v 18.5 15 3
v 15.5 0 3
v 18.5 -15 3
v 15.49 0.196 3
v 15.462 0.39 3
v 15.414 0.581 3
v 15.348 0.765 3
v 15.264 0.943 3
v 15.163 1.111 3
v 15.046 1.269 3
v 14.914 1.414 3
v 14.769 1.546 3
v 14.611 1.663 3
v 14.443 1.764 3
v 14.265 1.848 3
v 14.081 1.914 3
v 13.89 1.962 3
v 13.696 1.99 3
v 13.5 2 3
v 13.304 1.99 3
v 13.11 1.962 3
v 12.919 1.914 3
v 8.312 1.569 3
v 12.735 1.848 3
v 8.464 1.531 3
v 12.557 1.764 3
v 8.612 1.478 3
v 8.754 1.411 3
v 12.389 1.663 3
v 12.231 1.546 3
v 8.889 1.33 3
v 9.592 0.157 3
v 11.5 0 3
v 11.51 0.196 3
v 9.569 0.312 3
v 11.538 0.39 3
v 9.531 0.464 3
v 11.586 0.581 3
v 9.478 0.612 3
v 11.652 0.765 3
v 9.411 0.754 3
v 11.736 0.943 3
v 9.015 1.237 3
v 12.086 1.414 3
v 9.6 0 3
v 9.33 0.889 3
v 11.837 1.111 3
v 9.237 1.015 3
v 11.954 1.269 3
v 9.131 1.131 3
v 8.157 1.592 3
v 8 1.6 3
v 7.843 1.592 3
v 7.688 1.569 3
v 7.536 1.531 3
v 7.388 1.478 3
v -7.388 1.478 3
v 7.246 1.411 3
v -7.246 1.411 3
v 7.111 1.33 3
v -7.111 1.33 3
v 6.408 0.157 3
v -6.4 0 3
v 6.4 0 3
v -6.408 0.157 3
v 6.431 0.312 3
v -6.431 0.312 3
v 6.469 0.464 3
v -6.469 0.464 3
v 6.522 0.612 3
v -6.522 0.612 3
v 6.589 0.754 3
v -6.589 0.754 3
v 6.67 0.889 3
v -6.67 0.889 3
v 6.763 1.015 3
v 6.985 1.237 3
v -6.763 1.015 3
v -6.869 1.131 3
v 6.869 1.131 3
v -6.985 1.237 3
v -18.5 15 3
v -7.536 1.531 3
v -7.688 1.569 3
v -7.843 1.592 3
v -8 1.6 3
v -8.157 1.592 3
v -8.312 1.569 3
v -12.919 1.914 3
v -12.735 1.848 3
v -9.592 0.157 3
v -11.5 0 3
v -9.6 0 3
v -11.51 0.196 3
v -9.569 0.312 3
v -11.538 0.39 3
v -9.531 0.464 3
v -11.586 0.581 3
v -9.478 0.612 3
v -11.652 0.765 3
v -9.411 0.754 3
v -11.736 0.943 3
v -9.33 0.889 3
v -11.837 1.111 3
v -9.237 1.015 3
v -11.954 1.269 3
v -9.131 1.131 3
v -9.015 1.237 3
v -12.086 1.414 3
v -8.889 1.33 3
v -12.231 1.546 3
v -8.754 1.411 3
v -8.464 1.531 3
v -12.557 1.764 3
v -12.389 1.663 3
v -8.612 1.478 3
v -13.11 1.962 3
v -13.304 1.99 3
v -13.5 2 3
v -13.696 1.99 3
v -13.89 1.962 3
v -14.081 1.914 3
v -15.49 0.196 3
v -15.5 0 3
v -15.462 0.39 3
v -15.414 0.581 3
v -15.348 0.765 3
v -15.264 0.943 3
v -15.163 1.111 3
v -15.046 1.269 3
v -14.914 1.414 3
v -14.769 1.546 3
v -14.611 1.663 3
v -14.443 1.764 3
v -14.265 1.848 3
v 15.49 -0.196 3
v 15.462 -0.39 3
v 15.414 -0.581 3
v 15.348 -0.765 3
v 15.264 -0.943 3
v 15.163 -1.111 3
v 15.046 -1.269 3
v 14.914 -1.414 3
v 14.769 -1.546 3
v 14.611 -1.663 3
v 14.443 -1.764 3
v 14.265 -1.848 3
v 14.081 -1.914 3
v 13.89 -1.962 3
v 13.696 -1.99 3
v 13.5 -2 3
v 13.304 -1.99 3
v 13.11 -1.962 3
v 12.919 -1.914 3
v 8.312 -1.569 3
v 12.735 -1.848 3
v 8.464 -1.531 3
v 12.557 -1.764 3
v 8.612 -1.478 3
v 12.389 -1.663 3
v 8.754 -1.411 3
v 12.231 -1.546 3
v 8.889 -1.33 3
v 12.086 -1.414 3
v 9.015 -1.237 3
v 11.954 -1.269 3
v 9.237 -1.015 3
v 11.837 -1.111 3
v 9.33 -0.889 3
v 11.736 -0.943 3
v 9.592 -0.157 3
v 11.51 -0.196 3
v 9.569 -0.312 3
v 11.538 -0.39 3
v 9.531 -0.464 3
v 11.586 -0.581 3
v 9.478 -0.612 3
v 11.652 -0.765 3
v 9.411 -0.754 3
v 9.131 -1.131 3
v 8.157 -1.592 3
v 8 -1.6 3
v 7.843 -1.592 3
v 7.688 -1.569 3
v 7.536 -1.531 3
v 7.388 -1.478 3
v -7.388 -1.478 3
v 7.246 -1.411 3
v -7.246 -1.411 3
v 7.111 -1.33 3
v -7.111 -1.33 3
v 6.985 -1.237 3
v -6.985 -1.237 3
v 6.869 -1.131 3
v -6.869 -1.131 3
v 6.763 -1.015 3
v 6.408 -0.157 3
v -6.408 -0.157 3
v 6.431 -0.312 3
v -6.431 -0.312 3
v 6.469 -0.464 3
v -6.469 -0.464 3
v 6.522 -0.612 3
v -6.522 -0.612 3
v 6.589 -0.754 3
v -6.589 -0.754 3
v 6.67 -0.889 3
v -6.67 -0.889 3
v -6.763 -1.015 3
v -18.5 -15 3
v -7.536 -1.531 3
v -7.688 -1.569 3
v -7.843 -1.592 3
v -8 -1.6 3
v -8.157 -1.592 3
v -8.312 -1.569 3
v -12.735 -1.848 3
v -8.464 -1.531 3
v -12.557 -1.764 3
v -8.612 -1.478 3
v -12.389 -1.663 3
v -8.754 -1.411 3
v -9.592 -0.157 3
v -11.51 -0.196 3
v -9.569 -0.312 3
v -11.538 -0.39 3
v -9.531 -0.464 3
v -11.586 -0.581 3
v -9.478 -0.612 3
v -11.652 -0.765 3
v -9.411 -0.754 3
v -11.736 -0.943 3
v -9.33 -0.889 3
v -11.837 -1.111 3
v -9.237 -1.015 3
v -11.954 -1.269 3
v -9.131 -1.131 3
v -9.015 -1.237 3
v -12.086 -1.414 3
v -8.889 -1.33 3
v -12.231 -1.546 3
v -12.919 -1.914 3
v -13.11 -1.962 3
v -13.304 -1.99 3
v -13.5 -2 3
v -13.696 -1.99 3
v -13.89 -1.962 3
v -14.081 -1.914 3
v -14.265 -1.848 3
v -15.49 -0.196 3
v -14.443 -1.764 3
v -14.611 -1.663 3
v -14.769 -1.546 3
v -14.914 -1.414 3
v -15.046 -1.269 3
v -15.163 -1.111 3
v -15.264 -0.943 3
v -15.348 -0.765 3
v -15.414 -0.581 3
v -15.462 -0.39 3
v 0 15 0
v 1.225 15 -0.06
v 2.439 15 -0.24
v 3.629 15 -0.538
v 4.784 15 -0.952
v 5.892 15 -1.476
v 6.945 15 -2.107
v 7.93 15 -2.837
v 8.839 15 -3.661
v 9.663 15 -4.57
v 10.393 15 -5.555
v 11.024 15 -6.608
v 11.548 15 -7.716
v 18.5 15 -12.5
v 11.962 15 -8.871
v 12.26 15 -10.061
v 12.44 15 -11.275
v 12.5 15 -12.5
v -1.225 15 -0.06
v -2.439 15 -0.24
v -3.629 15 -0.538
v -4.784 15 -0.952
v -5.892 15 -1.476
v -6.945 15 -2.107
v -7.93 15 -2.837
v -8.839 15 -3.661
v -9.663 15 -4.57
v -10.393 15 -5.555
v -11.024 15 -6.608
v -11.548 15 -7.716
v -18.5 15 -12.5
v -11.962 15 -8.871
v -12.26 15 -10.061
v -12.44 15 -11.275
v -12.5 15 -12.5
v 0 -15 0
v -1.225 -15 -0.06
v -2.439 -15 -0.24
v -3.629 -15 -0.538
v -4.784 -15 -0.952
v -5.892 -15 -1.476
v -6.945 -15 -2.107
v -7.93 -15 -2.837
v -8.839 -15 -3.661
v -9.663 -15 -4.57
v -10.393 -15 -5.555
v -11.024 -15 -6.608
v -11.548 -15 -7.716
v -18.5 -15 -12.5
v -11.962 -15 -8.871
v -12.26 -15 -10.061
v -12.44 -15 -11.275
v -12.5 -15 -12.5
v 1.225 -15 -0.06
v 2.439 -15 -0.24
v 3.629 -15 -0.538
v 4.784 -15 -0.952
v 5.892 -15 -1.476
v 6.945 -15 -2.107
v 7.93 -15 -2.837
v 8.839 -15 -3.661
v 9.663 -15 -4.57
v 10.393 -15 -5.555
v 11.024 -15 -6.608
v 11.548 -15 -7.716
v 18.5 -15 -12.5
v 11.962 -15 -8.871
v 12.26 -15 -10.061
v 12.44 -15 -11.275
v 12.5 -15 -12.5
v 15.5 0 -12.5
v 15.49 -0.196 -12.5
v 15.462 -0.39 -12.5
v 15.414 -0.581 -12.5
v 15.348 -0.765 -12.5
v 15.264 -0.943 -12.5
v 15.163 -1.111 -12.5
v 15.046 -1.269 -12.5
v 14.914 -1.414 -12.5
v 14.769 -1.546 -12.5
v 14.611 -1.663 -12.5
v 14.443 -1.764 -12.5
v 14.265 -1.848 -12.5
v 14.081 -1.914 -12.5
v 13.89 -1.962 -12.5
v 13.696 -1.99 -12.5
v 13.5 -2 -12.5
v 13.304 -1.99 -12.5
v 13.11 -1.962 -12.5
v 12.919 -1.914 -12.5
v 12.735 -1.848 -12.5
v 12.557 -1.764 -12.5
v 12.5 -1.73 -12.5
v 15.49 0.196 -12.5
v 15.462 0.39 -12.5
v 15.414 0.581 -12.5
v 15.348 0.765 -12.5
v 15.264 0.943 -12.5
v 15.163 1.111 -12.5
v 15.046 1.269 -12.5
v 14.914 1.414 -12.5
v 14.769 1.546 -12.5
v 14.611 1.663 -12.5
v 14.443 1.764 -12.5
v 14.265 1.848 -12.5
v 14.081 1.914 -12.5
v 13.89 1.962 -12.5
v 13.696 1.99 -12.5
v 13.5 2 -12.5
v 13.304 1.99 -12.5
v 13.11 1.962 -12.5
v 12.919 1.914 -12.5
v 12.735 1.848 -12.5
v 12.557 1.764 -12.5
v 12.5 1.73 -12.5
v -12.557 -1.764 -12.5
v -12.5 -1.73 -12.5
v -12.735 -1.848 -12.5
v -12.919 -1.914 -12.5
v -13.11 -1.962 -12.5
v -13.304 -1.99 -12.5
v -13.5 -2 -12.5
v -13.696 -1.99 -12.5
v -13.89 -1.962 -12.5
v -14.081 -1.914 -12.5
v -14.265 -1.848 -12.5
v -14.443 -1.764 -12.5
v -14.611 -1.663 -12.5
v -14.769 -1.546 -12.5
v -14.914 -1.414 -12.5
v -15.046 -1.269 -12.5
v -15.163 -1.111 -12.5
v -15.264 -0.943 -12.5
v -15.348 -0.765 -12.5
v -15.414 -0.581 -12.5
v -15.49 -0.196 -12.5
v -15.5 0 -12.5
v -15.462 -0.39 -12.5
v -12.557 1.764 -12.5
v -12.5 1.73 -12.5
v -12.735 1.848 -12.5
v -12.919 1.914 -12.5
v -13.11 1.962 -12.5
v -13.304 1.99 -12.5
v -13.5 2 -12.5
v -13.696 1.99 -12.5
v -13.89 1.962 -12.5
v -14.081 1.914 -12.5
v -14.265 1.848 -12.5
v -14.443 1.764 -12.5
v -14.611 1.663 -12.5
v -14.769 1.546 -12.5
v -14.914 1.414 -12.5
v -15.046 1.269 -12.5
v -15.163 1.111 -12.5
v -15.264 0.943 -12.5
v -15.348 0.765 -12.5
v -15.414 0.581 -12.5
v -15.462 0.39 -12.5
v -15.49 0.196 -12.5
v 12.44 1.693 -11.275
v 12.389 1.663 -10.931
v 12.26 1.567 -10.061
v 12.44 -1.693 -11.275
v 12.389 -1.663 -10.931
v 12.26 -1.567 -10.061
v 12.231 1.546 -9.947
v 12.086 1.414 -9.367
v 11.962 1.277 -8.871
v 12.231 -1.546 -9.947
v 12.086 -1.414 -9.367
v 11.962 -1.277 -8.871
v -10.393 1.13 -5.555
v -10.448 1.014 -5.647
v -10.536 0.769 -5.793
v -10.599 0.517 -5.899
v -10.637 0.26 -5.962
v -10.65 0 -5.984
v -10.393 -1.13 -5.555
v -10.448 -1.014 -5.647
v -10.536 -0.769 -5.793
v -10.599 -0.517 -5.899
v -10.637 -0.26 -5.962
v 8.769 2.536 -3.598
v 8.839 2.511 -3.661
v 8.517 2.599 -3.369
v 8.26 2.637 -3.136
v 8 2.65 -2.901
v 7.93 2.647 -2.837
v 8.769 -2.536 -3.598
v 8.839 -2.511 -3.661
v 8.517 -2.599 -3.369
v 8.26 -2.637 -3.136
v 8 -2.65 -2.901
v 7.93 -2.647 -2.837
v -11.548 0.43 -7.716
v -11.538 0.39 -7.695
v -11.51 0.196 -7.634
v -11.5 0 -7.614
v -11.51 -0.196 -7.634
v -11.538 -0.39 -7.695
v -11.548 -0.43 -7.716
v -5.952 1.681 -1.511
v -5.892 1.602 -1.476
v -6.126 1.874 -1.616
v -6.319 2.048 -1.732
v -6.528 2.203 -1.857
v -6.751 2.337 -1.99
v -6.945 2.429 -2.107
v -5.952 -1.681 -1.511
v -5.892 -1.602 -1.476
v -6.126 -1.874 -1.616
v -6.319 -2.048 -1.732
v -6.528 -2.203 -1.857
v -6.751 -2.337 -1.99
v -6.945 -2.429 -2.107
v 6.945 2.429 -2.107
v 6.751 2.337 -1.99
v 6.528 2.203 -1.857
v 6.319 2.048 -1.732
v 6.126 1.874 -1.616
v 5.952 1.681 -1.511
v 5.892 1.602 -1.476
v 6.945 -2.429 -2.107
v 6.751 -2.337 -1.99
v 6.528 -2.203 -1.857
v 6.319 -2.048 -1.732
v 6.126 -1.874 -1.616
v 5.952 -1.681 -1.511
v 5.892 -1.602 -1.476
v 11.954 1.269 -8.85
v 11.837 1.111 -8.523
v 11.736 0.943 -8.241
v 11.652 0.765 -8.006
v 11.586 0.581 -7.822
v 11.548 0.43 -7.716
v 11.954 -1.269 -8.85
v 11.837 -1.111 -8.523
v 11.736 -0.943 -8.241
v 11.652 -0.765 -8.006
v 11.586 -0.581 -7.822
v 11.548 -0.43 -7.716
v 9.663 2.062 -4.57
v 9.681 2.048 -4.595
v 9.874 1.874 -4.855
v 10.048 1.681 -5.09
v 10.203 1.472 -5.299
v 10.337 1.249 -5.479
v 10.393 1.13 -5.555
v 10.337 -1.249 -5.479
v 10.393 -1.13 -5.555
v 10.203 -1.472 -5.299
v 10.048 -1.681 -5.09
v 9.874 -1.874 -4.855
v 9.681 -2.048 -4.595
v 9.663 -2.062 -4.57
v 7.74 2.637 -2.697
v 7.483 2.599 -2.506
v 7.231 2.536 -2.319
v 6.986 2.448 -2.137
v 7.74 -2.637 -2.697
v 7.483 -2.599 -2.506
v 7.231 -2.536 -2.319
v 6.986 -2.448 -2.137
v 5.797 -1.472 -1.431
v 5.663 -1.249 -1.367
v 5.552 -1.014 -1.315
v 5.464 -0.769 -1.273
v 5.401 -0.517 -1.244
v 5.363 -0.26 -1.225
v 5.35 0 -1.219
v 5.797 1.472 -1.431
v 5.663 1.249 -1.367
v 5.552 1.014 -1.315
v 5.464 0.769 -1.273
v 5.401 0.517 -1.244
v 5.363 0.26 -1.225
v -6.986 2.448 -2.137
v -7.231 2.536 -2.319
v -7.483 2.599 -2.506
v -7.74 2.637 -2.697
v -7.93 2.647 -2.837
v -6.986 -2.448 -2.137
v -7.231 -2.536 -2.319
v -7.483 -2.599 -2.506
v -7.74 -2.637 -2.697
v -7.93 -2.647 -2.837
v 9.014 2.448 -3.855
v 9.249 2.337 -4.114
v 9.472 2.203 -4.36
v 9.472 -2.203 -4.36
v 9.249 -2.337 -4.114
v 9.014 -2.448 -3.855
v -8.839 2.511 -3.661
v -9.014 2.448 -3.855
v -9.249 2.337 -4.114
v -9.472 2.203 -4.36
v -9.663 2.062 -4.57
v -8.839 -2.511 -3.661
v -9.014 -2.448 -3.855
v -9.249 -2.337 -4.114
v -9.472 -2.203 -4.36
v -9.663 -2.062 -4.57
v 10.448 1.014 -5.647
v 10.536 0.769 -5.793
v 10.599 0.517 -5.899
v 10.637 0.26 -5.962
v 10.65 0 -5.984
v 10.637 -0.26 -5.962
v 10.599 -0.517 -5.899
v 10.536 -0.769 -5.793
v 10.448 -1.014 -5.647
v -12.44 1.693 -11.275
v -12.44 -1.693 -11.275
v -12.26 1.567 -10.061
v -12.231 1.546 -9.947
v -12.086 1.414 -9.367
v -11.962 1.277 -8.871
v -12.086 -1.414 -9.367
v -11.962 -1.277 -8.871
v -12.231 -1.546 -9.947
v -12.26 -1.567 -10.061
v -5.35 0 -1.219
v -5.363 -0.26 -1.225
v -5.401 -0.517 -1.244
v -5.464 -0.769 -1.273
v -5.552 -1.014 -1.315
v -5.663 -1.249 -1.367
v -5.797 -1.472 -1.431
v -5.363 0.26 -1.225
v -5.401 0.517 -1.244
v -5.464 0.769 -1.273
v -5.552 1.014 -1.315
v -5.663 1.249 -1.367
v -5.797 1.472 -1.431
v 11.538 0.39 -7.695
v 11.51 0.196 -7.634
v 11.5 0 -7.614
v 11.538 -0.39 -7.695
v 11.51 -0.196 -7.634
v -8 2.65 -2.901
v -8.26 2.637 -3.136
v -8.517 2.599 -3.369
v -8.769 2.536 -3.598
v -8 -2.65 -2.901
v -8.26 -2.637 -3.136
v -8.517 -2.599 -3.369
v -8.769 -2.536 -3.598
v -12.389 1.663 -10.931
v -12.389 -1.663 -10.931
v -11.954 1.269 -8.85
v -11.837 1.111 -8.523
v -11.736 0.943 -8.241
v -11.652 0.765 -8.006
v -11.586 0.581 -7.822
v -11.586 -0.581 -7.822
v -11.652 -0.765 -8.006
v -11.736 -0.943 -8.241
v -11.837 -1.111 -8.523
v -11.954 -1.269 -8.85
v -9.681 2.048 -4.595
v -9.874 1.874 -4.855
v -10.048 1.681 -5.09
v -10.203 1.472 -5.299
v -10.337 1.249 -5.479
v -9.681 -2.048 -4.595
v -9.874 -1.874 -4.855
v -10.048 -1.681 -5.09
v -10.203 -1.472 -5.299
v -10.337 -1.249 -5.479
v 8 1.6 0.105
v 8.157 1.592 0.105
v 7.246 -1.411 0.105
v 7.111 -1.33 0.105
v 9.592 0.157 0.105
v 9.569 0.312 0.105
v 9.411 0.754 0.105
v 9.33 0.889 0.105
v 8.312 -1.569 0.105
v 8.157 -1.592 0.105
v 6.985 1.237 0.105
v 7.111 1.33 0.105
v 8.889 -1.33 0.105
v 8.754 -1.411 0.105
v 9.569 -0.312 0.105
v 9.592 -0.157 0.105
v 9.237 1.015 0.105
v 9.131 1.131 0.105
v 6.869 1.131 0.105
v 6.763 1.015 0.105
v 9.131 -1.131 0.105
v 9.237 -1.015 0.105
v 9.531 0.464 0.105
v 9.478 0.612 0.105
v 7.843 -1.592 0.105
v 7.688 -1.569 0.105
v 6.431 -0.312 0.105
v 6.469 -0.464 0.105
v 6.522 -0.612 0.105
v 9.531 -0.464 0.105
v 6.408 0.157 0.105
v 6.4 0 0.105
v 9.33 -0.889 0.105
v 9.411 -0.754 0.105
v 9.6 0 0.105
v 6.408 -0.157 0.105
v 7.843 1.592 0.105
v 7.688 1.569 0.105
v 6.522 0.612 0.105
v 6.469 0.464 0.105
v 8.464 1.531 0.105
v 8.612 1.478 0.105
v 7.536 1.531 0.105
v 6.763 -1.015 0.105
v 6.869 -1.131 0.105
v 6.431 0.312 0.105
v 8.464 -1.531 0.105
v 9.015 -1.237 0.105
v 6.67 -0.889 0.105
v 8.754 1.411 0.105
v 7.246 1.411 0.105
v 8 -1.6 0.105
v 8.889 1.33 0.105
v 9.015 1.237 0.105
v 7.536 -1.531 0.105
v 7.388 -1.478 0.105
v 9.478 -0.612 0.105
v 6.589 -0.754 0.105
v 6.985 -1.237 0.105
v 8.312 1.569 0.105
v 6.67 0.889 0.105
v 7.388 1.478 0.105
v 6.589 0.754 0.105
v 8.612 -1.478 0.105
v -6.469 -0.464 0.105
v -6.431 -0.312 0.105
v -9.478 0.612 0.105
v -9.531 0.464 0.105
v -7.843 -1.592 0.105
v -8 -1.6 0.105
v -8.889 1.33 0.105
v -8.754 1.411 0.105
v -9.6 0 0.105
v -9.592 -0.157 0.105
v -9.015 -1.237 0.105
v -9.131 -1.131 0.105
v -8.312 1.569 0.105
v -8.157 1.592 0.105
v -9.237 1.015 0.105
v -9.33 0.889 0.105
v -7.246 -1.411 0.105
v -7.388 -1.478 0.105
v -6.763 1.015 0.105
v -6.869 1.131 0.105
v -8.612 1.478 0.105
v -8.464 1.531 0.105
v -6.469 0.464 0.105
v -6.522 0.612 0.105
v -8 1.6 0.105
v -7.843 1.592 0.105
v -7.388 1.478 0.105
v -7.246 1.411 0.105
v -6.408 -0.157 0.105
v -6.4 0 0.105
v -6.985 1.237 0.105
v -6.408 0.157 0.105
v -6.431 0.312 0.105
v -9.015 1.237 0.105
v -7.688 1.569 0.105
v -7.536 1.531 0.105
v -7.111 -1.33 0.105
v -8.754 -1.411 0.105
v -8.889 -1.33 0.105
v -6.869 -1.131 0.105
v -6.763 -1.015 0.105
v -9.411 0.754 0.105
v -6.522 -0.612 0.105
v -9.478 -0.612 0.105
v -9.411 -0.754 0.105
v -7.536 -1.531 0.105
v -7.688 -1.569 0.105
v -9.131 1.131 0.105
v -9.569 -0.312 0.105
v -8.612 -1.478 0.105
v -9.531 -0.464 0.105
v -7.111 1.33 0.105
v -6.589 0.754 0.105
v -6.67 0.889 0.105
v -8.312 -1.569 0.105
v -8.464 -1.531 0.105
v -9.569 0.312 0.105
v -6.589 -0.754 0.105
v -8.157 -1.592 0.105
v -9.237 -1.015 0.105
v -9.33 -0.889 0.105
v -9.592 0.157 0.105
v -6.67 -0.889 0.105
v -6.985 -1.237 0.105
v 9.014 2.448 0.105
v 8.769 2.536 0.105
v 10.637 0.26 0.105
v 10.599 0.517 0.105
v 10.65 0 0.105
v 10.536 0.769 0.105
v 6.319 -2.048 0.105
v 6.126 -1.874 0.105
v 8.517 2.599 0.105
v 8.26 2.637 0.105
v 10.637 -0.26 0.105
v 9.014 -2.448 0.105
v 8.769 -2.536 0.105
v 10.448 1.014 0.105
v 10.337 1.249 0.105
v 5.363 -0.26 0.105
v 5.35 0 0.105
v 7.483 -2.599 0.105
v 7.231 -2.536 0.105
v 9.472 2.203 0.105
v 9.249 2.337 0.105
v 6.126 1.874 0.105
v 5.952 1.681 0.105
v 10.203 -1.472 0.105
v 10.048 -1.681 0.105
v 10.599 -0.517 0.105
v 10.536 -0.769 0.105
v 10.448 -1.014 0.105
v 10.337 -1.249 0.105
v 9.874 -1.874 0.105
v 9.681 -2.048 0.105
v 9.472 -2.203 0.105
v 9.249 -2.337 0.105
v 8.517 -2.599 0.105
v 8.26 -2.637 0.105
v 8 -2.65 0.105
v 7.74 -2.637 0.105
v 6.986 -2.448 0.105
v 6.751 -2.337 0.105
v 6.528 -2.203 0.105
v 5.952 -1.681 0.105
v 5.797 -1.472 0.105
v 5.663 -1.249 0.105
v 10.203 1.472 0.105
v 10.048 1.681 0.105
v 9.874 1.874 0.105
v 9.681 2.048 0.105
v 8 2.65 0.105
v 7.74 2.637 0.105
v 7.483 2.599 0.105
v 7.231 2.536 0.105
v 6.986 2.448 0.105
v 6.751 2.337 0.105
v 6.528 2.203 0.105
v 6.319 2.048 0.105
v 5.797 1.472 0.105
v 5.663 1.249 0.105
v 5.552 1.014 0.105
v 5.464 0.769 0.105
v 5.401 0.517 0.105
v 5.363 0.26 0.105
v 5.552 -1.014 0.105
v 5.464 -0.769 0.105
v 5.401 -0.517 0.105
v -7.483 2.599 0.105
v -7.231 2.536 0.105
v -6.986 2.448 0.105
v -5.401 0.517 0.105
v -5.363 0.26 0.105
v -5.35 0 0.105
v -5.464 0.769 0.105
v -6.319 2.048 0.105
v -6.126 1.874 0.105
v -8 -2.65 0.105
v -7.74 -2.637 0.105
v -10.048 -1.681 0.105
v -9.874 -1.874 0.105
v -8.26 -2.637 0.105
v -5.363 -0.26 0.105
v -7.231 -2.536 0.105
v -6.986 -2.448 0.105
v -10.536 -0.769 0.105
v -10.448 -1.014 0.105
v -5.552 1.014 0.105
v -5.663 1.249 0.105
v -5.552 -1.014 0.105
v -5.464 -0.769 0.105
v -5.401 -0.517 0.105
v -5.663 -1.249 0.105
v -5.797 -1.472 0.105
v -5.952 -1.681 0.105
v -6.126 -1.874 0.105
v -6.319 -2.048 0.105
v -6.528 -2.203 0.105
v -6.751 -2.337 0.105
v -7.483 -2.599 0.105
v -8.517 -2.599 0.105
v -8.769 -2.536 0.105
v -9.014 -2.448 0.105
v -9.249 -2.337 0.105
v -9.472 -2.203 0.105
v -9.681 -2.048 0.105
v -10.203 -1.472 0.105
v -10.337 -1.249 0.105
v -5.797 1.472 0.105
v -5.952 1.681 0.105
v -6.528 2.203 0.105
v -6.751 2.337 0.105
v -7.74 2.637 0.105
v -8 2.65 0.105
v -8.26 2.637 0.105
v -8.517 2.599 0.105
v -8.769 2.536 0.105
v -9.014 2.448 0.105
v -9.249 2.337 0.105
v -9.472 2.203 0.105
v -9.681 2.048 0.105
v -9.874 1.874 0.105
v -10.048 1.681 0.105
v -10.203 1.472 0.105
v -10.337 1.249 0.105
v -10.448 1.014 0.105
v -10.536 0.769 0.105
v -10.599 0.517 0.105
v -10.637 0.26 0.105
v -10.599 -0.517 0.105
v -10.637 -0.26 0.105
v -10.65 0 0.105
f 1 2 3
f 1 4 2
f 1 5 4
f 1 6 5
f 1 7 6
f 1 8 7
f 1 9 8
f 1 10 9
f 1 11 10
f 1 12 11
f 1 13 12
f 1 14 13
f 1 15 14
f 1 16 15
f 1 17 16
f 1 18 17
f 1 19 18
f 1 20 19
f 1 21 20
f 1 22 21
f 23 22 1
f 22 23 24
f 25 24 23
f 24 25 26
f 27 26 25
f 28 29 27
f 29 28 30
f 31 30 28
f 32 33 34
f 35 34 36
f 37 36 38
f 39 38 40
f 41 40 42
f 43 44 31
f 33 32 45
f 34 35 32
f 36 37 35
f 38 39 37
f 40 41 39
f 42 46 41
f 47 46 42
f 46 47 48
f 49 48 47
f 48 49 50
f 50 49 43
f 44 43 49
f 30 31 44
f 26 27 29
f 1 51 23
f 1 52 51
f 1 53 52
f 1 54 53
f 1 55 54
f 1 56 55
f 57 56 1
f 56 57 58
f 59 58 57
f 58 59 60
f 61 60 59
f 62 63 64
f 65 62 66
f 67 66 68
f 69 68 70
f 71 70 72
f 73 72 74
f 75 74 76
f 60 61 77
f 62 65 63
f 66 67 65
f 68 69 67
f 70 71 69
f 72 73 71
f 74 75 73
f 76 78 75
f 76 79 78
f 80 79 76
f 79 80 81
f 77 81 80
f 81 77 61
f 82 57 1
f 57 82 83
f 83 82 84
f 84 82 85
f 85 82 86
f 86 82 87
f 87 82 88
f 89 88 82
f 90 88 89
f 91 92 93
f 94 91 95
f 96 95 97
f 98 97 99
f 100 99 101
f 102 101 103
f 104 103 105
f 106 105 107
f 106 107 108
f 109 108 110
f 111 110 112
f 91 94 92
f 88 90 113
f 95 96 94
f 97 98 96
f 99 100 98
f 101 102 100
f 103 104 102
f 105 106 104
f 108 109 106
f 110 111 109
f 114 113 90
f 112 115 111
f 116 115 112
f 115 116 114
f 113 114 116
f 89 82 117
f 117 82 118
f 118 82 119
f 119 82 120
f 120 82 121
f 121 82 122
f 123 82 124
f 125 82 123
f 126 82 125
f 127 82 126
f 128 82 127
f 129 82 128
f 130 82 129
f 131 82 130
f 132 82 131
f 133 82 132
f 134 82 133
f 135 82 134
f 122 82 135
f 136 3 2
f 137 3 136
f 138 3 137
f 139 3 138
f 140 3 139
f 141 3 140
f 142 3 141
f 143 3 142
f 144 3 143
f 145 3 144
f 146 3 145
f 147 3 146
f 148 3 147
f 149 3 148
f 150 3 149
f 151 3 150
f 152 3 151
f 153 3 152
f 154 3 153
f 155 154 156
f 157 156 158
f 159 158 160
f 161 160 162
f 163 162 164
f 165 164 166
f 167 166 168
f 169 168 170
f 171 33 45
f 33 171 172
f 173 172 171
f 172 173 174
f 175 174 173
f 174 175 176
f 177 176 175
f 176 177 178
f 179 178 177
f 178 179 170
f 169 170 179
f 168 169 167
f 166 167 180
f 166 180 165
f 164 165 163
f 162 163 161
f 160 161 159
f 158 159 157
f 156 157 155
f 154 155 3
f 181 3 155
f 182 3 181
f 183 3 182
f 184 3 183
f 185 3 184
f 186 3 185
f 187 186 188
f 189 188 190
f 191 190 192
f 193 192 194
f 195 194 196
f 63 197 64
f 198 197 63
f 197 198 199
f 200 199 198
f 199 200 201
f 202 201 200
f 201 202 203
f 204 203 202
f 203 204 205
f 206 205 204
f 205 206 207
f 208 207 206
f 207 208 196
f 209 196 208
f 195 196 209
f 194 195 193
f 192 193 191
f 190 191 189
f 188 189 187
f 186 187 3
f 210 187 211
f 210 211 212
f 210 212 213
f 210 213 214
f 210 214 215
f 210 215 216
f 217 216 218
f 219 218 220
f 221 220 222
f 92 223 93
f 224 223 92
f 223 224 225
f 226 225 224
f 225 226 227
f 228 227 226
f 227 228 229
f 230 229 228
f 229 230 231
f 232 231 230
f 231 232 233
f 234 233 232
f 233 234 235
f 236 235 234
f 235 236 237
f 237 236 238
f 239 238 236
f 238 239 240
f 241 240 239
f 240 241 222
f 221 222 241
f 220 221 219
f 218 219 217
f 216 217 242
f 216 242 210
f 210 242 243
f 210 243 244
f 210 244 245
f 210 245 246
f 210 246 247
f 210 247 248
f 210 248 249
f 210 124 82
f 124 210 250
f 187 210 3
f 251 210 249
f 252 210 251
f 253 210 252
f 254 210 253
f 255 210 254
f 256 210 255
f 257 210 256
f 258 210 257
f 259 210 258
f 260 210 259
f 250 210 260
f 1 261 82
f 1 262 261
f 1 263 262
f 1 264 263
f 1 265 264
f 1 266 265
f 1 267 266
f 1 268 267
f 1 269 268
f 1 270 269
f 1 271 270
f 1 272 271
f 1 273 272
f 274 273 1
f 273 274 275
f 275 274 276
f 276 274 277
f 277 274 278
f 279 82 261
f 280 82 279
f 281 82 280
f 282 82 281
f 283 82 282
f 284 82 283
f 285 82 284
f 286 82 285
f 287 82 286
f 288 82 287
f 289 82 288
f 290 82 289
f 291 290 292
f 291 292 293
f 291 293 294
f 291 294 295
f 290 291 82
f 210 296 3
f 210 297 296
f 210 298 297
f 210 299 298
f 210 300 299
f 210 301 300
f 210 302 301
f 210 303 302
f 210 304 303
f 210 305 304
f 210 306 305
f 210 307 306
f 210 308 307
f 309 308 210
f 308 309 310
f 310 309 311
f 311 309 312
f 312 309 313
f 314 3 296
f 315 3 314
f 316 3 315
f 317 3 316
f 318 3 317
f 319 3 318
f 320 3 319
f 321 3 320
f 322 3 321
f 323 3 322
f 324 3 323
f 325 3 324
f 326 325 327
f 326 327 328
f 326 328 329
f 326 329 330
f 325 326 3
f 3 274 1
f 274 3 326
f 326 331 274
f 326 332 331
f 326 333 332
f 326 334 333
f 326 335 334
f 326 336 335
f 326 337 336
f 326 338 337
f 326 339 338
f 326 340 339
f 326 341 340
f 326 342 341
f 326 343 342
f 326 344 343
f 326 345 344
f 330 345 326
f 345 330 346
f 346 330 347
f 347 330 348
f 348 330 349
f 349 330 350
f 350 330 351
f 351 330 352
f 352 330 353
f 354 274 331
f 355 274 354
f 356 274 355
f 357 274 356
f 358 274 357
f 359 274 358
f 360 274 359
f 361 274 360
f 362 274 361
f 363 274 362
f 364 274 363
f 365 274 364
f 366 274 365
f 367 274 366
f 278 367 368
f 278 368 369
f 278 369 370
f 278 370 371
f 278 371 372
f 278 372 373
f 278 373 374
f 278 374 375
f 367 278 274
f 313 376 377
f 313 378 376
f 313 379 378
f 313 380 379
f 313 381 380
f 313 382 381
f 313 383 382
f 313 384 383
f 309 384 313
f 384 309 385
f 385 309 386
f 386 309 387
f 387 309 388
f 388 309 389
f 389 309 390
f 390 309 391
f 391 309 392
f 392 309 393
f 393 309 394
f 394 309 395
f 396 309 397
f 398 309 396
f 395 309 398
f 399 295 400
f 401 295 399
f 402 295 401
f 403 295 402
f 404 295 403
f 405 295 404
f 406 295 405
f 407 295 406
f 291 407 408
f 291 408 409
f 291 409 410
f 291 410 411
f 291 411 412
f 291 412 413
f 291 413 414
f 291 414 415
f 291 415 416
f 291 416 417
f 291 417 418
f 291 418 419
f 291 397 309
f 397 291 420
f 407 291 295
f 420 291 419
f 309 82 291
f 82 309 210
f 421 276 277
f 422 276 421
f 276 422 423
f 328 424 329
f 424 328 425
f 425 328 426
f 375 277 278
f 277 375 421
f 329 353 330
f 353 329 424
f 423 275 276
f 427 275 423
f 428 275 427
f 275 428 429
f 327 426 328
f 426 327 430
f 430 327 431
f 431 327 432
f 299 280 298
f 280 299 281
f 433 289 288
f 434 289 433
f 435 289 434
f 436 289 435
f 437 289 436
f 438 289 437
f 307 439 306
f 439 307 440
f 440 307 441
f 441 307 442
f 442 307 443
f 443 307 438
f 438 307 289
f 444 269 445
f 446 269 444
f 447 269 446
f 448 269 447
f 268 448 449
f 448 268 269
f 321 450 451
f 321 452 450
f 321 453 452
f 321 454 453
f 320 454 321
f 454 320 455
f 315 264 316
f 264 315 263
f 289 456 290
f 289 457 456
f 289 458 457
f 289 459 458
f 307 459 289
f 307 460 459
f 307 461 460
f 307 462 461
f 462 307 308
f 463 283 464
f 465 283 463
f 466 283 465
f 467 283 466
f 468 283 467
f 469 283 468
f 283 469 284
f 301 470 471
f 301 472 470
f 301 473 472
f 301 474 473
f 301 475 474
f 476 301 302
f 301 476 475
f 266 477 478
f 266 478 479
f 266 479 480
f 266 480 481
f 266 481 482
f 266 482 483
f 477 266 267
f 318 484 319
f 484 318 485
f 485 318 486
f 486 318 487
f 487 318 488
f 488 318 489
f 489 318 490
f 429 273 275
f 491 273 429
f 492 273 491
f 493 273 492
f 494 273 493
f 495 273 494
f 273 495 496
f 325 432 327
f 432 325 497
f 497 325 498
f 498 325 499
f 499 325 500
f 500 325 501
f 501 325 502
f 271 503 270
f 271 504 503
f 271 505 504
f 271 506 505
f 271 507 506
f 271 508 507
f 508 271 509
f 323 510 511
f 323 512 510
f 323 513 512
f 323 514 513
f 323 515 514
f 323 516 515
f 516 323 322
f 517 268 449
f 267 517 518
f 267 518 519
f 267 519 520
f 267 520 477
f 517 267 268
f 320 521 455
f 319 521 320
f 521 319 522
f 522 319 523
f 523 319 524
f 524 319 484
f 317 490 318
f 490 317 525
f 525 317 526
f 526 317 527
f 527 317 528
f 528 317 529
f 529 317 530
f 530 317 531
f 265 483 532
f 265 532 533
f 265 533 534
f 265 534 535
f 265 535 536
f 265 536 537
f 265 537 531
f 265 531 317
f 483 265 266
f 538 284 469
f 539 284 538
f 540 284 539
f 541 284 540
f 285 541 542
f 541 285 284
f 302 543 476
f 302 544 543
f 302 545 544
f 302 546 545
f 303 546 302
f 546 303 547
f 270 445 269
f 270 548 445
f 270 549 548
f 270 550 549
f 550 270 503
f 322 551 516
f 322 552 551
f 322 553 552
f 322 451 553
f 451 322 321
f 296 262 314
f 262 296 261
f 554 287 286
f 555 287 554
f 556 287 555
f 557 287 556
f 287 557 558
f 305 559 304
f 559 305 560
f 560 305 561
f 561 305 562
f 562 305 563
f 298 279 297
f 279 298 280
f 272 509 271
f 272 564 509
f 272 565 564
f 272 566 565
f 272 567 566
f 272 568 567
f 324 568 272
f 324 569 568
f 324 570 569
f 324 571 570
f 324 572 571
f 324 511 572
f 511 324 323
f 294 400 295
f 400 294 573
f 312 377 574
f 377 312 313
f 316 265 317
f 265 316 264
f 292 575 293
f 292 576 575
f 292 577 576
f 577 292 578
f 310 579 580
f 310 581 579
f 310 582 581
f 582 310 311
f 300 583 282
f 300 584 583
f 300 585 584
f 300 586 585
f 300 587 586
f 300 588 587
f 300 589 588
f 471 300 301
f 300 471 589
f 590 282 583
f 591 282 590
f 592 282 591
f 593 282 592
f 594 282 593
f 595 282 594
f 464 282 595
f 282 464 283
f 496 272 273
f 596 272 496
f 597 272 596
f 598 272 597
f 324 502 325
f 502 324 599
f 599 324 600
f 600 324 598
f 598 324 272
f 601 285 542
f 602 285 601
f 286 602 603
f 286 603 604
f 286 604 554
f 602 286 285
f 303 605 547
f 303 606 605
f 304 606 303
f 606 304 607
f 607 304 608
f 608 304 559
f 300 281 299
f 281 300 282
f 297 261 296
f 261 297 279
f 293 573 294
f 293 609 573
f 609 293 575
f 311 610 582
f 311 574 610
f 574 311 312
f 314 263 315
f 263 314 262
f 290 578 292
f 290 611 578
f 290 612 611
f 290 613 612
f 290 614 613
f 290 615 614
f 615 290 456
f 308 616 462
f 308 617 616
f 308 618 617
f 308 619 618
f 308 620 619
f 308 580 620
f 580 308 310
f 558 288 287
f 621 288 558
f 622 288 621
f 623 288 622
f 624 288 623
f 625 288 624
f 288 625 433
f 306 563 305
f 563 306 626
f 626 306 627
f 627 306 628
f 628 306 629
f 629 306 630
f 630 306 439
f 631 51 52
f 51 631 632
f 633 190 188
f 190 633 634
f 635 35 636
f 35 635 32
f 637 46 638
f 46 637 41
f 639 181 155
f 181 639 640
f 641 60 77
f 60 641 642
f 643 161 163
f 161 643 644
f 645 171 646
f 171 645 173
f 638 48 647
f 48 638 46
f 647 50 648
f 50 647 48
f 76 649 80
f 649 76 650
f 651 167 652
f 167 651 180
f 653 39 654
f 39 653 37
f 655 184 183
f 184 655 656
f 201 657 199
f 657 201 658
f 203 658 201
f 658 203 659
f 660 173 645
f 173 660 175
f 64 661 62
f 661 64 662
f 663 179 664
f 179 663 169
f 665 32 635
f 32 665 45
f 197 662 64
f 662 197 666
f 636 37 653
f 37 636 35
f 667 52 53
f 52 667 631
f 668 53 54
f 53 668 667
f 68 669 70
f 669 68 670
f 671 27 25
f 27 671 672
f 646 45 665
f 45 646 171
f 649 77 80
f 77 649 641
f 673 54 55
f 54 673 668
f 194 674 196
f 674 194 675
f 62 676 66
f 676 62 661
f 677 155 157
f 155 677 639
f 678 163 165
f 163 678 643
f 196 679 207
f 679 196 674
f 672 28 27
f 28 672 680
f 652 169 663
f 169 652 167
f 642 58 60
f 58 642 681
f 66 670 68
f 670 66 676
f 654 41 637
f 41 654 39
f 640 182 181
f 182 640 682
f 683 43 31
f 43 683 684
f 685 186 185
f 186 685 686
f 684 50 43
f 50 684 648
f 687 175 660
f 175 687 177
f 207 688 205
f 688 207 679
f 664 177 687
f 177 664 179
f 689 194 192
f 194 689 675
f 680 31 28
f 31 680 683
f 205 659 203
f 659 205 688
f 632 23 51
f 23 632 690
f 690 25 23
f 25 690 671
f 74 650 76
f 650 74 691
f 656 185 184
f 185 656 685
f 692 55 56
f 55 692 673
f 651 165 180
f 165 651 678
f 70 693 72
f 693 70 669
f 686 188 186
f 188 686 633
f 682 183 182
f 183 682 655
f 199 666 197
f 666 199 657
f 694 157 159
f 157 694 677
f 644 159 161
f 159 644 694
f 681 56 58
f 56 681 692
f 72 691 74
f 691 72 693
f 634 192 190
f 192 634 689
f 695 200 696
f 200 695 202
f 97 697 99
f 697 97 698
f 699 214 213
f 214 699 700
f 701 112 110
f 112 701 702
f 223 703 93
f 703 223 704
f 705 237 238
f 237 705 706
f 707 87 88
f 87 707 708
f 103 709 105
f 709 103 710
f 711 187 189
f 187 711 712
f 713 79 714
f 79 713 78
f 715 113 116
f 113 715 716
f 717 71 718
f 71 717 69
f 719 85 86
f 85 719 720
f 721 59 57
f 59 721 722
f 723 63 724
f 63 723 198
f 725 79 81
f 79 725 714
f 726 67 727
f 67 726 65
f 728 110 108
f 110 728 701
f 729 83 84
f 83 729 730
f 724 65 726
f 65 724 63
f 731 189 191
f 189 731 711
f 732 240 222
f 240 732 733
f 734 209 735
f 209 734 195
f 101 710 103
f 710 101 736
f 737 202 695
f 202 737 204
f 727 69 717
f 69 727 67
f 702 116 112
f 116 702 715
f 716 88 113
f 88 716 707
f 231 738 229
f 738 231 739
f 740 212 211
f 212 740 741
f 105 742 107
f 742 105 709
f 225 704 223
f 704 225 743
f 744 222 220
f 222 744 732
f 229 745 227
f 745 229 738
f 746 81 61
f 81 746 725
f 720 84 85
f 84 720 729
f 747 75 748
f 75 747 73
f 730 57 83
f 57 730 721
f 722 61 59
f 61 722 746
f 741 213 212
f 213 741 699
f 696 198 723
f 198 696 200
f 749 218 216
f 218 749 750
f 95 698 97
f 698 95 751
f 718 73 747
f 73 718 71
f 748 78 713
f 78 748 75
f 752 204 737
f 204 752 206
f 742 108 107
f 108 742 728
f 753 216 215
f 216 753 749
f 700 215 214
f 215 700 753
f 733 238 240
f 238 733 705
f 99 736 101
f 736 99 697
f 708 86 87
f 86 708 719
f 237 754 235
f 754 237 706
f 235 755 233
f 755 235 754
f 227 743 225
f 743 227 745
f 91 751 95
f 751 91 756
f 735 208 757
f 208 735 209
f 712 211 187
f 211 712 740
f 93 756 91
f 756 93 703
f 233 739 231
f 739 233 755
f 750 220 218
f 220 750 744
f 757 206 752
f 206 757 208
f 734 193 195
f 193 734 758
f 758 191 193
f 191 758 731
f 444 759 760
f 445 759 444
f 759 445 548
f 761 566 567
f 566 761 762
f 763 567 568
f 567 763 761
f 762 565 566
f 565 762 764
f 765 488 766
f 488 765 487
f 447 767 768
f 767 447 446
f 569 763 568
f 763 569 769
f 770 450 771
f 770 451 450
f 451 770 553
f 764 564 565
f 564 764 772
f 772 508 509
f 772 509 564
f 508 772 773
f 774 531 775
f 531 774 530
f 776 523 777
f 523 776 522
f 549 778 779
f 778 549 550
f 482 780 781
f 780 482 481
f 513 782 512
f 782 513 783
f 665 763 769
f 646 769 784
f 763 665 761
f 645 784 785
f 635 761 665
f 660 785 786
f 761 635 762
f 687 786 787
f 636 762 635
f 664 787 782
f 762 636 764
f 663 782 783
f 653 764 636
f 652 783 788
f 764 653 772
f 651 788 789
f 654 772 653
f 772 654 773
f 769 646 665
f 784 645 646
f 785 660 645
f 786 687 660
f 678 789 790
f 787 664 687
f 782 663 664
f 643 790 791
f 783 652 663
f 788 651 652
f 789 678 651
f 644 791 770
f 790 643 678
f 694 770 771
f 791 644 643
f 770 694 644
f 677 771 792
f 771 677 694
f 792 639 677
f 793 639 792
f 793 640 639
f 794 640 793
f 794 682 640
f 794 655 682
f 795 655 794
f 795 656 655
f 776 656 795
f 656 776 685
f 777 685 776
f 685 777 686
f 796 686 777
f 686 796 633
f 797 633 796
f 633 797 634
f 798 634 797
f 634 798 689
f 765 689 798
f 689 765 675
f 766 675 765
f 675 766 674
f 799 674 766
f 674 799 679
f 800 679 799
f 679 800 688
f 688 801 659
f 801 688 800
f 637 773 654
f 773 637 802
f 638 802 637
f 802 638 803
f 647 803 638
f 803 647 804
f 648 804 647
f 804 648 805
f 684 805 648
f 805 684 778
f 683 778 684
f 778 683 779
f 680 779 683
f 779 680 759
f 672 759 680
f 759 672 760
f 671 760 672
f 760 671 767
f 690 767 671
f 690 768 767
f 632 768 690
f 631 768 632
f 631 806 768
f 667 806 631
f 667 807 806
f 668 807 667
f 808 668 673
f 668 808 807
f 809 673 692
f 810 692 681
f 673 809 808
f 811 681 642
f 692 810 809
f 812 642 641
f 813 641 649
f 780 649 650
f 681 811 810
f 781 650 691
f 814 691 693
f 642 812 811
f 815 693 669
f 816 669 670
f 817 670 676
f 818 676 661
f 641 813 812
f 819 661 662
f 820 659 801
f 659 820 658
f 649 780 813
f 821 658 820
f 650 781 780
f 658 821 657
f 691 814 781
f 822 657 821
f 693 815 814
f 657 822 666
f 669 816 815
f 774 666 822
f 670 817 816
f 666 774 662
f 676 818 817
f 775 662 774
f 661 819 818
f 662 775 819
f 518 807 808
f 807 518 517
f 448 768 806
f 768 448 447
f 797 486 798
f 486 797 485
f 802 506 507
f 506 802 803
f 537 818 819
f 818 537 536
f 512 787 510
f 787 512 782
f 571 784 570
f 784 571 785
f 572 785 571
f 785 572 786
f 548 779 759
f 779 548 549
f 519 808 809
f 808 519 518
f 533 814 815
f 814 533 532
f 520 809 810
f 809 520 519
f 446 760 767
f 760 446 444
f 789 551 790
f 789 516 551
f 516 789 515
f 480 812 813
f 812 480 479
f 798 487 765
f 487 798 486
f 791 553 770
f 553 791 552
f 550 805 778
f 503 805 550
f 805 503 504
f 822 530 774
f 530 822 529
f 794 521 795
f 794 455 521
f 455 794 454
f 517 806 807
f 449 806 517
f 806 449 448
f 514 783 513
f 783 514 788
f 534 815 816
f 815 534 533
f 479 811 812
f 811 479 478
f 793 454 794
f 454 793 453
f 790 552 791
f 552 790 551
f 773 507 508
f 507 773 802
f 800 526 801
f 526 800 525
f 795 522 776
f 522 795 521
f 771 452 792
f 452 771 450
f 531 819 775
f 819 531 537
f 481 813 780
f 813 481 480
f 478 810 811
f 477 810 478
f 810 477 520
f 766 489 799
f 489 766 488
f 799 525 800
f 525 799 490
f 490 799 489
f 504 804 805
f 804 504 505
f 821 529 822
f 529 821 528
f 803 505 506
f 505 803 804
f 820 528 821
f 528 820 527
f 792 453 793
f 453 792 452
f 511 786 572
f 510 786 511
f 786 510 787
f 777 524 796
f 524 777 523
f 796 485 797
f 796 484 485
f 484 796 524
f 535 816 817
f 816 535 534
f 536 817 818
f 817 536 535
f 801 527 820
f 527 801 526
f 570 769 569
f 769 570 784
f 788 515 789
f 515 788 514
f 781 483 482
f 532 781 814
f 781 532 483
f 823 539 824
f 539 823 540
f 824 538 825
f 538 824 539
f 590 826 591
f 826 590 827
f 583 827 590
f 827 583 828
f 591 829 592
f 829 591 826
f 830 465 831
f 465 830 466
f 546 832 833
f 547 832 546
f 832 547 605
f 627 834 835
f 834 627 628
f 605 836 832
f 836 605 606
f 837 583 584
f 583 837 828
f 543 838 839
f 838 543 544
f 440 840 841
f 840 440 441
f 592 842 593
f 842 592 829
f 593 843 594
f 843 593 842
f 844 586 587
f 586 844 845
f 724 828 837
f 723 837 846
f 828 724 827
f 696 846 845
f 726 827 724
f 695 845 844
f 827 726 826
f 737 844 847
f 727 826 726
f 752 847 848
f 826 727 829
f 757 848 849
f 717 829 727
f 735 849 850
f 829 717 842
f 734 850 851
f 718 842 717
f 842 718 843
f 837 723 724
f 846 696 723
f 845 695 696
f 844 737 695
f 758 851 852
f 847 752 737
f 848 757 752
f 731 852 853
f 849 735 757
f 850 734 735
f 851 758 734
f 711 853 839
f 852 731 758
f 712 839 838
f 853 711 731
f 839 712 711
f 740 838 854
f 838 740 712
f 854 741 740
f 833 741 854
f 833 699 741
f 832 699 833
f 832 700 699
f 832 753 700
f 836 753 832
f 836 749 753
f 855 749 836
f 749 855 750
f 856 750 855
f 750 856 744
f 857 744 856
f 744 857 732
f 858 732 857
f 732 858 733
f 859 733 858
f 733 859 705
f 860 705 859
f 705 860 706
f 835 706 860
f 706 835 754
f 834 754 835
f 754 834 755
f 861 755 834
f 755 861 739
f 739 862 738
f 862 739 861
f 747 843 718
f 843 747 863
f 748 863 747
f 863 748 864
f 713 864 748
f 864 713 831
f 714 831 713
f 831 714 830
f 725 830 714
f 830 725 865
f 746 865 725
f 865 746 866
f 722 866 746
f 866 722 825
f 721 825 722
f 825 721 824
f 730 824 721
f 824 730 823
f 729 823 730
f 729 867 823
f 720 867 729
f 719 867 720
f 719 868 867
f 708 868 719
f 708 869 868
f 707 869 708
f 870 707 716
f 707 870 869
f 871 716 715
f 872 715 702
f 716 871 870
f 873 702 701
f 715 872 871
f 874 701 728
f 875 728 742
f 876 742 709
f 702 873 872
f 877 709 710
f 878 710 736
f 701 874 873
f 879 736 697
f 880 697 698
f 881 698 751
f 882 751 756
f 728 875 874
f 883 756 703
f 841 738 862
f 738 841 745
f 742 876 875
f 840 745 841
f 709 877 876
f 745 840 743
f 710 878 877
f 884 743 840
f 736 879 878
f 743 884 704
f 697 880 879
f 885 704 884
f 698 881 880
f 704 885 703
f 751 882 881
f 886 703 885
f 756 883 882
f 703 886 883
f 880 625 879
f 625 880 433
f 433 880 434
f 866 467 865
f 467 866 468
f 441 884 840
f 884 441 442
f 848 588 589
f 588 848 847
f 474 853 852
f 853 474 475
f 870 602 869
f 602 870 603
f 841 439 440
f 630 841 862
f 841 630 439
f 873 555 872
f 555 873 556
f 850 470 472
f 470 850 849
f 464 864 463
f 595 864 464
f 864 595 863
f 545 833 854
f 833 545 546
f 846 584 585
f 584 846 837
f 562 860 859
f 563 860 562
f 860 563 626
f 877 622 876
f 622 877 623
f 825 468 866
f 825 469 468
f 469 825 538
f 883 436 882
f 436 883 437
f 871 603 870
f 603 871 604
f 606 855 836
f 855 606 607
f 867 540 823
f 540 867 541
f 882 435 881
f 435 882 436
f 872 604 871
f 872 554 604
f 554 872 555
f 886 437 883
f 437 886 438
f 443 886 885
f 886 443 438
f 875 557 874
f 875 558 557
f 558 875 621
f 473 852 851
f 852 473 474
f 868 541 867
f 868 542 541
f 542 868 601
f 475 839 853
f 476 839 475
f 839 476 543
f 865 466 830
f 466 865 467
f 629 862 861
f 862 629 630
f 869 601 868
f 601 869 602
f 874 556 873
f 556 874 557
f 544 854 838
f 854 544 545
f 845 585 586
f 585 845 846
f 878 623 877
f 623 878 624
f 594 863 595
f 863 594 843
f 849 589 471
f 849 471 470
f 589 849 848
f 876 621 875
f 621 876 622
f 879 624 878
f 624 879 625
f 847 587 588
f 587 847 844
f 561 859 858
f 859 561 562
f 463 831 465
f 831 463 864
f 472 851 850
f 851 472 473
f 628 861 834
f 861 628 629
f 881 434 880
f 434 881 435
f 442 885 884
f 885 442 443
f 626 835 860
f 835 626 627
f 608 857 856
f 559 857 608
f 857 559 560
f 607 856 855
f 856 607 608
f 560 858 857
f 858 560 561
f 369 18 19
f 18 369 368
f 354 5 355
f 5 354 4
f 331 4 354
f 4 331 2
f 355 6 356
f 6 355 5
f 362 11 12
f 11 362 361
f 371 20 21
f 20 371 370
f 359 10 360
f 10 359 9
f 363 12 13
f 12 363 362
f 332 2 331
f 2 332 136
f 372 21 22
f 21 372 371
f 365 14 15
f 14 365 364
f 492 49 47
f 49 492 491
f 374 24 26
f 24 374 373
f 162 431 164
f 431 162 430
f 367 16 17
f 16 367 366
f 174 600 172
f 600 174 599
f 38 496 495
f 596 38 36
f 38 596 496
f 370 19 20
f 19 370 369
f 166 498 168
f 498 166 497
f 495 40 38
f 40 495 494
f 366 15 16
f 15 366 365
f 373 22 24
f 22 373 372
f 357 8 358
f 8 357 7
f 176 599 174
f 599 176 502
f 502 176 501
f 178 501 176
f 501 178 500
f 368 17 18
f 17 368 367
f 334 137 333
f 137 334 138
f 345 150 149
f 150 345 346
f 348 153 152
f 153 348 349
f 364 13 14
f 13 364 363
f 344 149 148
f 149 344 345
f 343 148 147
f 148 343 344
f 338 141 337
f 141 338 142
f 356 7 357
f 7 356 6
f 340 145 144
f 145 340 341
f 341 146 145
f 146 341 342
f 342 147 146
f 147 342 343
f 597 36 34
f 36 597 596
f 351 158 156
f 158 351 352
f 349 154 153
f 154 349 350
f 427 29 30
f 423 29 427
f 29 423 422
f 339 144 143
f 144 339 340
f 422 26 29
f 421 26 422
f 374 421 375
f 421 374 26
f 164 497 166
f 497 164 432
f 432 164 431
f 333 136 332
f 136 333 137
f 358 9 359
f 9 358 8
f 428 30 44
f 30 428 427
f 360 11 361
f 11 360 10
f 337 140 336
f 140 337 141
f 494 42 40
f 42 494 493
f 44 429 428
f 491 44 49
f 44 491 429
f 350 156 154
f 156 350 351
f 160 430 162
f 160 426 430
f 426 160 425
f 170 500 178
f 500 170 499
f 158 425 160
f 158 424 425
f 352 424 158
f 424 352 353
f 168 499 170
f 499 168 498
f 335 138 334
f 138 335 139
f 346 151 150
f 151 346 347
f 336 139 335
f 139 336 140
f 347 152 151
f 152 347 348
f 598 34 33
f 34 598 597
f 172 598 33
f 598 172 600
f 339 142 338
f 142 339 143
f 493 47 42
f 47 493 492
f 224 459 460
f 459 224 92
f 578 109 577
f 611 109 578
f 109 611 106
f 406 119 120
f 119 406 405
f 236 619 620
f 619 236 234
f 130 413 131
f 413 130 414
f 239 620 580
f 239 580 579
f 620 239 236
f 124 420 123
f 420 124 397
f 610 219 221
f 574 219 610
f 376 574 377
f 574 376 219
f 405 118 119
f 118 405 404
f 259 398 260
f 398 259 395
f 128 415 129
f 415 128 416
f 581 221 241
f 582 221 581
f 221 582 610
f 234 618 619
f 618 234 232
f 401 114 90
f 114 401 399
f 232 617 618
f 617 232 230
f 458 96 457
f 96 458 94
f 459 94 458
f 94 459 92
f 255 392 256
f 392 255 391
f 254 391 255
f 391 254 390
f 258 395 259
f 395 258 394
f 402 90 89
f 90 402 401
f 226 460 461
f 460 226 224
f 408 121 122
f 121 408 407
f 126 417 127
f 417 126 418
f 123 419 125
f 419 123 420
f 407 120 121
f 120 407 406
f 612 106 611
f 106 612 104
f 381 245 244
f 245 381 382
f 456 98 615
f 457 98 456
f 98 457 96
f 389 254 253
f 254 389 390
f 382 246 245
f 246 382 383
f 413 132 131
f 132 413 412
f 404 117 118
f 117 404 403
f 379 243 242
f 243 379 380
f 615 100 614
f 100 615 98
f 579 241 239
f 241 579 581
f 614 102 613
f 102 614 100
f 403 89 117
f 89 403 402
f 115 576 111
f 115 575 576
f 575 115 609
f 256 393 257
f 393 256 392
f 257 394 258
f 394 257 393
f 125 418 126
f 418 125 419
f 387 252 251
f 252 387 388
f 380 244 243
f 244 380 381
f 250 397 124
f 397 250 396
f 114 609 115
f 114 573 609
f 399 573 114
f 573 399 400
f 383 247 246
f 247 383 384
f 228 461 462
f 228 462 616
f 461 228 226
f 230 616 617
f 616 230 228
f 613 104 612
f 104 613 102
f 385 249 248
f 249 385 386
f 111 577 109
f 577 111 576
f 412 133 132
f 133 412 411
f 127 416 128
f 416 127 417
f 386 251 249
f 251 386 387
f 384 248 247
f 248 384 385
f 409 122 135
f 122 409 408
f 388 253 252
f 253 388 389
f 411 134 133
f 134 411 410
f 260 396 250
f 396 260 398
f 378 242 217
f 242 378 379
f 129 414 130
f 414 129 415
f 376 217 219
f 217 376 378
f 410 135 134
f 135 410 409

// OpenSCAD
// Mount for M5Stack Atomic Proto Kit on a 25mm pipe

// --- Parameters ---
pipe_diameter = 25;         // Pipe diameter
wall_thickness = 3;         // Wall thickness

// Base dimensions for Atomic Proto Kit (24x24mm)
base_size = 24 + 2 * wall_thickness;

// M3 mounting holes for Atomic Proto (16mm spacing)
mount_hole_spacing = 16;
mount_hole_dia = 3.2;       // For M3 screws with tolerance
screw_head_dia = 5.3;       // M3 screw head diameter
screw_head_height = 3;      // M3 screw head height

// Holes for zip ties
zip_tie_hole_dia = 4;
zip_tie_hole_spacing = pipe_diameter + 12; // Distance between holes

$fn=64; // Model resolution

// Calculated Z value for the mount surface at the hole location (on the inner side of the clamp)
hole_surface_z = -pipe_diameter/2 + sqrt(pow(pipe_diameter/2, 2) - pow(mount_hole_spacing/2, 2));

// --- Model ---
difference() {
    // Main body (base + clamp)
    union() {
        // Platform for mounting the device
        translate([-base_size/2, -base_size/2, 0])
            cube([base_size, base_size, wall_thickness]);

        // Block for the pipe clamp
        translate([-zip_tie_hole_spacing/2, -base_size/2, -pipe_diameter/2])
            cube([zip_tie_hole_spacing, base_size, pipe_diameter/2 + wall_thickness]);
    }

    // Cutout for the pipe
    translate([0, 0, -pipe_diameter/2])
        rotate([90, 0, 0])
            cylinder(d=pipe_diameter, h=base_size+1, center=true);

    // Mounting holes for Atomic Proto Kit (M3) - through the entire part
    translate([mount_hole_spacing/2, 0, -pipe_diameter/2 - 1])
        cylinder(d=mount_hole_dia, h = wall_thickness + pipe_diameter/2 + 2);
    translate([-mount_hole_spacing/2, 0, -pipe_diameter/2 - 1])
        cylinder(d=mount_hole_dia, h = wall_thickness + pipe_diameter/2 + 2);

    // Countersink for screw heads on the bottom side (by the pipe)
    translate([mount_hole_spacing/2, 0, -pipe_diameter/2 - 1])
        cylinder(d=screw_head_dia, h = hole_surface_z + screw_head_height + pipe_diameter/2 + 1);
    translate([-mount_hole_spacing/2, 0, -pipe_diameter/2 - 1])
        cylinder(d=screw_head_dia, h = hole_surface_z + screw_head_height + pipe_diameter/2 + 1);

    // Holes for zip ties
    translate([zip_tie_hole_spacing/2 - wall_thickness - zip_tie_hole_dia/2, 0, -pipe_diameter])
        cylinder(d=zip_tie_hole_dia, h=pipe_diameter*2);
    translate([-zip_tie_hole_spacing/2 + wall_thickness + zip_tie_hole_dia/2, 0, -pipe_diameter])
        cylinder(d=zip_tie_hole_dia, h=pipe_diameter*2);
}
